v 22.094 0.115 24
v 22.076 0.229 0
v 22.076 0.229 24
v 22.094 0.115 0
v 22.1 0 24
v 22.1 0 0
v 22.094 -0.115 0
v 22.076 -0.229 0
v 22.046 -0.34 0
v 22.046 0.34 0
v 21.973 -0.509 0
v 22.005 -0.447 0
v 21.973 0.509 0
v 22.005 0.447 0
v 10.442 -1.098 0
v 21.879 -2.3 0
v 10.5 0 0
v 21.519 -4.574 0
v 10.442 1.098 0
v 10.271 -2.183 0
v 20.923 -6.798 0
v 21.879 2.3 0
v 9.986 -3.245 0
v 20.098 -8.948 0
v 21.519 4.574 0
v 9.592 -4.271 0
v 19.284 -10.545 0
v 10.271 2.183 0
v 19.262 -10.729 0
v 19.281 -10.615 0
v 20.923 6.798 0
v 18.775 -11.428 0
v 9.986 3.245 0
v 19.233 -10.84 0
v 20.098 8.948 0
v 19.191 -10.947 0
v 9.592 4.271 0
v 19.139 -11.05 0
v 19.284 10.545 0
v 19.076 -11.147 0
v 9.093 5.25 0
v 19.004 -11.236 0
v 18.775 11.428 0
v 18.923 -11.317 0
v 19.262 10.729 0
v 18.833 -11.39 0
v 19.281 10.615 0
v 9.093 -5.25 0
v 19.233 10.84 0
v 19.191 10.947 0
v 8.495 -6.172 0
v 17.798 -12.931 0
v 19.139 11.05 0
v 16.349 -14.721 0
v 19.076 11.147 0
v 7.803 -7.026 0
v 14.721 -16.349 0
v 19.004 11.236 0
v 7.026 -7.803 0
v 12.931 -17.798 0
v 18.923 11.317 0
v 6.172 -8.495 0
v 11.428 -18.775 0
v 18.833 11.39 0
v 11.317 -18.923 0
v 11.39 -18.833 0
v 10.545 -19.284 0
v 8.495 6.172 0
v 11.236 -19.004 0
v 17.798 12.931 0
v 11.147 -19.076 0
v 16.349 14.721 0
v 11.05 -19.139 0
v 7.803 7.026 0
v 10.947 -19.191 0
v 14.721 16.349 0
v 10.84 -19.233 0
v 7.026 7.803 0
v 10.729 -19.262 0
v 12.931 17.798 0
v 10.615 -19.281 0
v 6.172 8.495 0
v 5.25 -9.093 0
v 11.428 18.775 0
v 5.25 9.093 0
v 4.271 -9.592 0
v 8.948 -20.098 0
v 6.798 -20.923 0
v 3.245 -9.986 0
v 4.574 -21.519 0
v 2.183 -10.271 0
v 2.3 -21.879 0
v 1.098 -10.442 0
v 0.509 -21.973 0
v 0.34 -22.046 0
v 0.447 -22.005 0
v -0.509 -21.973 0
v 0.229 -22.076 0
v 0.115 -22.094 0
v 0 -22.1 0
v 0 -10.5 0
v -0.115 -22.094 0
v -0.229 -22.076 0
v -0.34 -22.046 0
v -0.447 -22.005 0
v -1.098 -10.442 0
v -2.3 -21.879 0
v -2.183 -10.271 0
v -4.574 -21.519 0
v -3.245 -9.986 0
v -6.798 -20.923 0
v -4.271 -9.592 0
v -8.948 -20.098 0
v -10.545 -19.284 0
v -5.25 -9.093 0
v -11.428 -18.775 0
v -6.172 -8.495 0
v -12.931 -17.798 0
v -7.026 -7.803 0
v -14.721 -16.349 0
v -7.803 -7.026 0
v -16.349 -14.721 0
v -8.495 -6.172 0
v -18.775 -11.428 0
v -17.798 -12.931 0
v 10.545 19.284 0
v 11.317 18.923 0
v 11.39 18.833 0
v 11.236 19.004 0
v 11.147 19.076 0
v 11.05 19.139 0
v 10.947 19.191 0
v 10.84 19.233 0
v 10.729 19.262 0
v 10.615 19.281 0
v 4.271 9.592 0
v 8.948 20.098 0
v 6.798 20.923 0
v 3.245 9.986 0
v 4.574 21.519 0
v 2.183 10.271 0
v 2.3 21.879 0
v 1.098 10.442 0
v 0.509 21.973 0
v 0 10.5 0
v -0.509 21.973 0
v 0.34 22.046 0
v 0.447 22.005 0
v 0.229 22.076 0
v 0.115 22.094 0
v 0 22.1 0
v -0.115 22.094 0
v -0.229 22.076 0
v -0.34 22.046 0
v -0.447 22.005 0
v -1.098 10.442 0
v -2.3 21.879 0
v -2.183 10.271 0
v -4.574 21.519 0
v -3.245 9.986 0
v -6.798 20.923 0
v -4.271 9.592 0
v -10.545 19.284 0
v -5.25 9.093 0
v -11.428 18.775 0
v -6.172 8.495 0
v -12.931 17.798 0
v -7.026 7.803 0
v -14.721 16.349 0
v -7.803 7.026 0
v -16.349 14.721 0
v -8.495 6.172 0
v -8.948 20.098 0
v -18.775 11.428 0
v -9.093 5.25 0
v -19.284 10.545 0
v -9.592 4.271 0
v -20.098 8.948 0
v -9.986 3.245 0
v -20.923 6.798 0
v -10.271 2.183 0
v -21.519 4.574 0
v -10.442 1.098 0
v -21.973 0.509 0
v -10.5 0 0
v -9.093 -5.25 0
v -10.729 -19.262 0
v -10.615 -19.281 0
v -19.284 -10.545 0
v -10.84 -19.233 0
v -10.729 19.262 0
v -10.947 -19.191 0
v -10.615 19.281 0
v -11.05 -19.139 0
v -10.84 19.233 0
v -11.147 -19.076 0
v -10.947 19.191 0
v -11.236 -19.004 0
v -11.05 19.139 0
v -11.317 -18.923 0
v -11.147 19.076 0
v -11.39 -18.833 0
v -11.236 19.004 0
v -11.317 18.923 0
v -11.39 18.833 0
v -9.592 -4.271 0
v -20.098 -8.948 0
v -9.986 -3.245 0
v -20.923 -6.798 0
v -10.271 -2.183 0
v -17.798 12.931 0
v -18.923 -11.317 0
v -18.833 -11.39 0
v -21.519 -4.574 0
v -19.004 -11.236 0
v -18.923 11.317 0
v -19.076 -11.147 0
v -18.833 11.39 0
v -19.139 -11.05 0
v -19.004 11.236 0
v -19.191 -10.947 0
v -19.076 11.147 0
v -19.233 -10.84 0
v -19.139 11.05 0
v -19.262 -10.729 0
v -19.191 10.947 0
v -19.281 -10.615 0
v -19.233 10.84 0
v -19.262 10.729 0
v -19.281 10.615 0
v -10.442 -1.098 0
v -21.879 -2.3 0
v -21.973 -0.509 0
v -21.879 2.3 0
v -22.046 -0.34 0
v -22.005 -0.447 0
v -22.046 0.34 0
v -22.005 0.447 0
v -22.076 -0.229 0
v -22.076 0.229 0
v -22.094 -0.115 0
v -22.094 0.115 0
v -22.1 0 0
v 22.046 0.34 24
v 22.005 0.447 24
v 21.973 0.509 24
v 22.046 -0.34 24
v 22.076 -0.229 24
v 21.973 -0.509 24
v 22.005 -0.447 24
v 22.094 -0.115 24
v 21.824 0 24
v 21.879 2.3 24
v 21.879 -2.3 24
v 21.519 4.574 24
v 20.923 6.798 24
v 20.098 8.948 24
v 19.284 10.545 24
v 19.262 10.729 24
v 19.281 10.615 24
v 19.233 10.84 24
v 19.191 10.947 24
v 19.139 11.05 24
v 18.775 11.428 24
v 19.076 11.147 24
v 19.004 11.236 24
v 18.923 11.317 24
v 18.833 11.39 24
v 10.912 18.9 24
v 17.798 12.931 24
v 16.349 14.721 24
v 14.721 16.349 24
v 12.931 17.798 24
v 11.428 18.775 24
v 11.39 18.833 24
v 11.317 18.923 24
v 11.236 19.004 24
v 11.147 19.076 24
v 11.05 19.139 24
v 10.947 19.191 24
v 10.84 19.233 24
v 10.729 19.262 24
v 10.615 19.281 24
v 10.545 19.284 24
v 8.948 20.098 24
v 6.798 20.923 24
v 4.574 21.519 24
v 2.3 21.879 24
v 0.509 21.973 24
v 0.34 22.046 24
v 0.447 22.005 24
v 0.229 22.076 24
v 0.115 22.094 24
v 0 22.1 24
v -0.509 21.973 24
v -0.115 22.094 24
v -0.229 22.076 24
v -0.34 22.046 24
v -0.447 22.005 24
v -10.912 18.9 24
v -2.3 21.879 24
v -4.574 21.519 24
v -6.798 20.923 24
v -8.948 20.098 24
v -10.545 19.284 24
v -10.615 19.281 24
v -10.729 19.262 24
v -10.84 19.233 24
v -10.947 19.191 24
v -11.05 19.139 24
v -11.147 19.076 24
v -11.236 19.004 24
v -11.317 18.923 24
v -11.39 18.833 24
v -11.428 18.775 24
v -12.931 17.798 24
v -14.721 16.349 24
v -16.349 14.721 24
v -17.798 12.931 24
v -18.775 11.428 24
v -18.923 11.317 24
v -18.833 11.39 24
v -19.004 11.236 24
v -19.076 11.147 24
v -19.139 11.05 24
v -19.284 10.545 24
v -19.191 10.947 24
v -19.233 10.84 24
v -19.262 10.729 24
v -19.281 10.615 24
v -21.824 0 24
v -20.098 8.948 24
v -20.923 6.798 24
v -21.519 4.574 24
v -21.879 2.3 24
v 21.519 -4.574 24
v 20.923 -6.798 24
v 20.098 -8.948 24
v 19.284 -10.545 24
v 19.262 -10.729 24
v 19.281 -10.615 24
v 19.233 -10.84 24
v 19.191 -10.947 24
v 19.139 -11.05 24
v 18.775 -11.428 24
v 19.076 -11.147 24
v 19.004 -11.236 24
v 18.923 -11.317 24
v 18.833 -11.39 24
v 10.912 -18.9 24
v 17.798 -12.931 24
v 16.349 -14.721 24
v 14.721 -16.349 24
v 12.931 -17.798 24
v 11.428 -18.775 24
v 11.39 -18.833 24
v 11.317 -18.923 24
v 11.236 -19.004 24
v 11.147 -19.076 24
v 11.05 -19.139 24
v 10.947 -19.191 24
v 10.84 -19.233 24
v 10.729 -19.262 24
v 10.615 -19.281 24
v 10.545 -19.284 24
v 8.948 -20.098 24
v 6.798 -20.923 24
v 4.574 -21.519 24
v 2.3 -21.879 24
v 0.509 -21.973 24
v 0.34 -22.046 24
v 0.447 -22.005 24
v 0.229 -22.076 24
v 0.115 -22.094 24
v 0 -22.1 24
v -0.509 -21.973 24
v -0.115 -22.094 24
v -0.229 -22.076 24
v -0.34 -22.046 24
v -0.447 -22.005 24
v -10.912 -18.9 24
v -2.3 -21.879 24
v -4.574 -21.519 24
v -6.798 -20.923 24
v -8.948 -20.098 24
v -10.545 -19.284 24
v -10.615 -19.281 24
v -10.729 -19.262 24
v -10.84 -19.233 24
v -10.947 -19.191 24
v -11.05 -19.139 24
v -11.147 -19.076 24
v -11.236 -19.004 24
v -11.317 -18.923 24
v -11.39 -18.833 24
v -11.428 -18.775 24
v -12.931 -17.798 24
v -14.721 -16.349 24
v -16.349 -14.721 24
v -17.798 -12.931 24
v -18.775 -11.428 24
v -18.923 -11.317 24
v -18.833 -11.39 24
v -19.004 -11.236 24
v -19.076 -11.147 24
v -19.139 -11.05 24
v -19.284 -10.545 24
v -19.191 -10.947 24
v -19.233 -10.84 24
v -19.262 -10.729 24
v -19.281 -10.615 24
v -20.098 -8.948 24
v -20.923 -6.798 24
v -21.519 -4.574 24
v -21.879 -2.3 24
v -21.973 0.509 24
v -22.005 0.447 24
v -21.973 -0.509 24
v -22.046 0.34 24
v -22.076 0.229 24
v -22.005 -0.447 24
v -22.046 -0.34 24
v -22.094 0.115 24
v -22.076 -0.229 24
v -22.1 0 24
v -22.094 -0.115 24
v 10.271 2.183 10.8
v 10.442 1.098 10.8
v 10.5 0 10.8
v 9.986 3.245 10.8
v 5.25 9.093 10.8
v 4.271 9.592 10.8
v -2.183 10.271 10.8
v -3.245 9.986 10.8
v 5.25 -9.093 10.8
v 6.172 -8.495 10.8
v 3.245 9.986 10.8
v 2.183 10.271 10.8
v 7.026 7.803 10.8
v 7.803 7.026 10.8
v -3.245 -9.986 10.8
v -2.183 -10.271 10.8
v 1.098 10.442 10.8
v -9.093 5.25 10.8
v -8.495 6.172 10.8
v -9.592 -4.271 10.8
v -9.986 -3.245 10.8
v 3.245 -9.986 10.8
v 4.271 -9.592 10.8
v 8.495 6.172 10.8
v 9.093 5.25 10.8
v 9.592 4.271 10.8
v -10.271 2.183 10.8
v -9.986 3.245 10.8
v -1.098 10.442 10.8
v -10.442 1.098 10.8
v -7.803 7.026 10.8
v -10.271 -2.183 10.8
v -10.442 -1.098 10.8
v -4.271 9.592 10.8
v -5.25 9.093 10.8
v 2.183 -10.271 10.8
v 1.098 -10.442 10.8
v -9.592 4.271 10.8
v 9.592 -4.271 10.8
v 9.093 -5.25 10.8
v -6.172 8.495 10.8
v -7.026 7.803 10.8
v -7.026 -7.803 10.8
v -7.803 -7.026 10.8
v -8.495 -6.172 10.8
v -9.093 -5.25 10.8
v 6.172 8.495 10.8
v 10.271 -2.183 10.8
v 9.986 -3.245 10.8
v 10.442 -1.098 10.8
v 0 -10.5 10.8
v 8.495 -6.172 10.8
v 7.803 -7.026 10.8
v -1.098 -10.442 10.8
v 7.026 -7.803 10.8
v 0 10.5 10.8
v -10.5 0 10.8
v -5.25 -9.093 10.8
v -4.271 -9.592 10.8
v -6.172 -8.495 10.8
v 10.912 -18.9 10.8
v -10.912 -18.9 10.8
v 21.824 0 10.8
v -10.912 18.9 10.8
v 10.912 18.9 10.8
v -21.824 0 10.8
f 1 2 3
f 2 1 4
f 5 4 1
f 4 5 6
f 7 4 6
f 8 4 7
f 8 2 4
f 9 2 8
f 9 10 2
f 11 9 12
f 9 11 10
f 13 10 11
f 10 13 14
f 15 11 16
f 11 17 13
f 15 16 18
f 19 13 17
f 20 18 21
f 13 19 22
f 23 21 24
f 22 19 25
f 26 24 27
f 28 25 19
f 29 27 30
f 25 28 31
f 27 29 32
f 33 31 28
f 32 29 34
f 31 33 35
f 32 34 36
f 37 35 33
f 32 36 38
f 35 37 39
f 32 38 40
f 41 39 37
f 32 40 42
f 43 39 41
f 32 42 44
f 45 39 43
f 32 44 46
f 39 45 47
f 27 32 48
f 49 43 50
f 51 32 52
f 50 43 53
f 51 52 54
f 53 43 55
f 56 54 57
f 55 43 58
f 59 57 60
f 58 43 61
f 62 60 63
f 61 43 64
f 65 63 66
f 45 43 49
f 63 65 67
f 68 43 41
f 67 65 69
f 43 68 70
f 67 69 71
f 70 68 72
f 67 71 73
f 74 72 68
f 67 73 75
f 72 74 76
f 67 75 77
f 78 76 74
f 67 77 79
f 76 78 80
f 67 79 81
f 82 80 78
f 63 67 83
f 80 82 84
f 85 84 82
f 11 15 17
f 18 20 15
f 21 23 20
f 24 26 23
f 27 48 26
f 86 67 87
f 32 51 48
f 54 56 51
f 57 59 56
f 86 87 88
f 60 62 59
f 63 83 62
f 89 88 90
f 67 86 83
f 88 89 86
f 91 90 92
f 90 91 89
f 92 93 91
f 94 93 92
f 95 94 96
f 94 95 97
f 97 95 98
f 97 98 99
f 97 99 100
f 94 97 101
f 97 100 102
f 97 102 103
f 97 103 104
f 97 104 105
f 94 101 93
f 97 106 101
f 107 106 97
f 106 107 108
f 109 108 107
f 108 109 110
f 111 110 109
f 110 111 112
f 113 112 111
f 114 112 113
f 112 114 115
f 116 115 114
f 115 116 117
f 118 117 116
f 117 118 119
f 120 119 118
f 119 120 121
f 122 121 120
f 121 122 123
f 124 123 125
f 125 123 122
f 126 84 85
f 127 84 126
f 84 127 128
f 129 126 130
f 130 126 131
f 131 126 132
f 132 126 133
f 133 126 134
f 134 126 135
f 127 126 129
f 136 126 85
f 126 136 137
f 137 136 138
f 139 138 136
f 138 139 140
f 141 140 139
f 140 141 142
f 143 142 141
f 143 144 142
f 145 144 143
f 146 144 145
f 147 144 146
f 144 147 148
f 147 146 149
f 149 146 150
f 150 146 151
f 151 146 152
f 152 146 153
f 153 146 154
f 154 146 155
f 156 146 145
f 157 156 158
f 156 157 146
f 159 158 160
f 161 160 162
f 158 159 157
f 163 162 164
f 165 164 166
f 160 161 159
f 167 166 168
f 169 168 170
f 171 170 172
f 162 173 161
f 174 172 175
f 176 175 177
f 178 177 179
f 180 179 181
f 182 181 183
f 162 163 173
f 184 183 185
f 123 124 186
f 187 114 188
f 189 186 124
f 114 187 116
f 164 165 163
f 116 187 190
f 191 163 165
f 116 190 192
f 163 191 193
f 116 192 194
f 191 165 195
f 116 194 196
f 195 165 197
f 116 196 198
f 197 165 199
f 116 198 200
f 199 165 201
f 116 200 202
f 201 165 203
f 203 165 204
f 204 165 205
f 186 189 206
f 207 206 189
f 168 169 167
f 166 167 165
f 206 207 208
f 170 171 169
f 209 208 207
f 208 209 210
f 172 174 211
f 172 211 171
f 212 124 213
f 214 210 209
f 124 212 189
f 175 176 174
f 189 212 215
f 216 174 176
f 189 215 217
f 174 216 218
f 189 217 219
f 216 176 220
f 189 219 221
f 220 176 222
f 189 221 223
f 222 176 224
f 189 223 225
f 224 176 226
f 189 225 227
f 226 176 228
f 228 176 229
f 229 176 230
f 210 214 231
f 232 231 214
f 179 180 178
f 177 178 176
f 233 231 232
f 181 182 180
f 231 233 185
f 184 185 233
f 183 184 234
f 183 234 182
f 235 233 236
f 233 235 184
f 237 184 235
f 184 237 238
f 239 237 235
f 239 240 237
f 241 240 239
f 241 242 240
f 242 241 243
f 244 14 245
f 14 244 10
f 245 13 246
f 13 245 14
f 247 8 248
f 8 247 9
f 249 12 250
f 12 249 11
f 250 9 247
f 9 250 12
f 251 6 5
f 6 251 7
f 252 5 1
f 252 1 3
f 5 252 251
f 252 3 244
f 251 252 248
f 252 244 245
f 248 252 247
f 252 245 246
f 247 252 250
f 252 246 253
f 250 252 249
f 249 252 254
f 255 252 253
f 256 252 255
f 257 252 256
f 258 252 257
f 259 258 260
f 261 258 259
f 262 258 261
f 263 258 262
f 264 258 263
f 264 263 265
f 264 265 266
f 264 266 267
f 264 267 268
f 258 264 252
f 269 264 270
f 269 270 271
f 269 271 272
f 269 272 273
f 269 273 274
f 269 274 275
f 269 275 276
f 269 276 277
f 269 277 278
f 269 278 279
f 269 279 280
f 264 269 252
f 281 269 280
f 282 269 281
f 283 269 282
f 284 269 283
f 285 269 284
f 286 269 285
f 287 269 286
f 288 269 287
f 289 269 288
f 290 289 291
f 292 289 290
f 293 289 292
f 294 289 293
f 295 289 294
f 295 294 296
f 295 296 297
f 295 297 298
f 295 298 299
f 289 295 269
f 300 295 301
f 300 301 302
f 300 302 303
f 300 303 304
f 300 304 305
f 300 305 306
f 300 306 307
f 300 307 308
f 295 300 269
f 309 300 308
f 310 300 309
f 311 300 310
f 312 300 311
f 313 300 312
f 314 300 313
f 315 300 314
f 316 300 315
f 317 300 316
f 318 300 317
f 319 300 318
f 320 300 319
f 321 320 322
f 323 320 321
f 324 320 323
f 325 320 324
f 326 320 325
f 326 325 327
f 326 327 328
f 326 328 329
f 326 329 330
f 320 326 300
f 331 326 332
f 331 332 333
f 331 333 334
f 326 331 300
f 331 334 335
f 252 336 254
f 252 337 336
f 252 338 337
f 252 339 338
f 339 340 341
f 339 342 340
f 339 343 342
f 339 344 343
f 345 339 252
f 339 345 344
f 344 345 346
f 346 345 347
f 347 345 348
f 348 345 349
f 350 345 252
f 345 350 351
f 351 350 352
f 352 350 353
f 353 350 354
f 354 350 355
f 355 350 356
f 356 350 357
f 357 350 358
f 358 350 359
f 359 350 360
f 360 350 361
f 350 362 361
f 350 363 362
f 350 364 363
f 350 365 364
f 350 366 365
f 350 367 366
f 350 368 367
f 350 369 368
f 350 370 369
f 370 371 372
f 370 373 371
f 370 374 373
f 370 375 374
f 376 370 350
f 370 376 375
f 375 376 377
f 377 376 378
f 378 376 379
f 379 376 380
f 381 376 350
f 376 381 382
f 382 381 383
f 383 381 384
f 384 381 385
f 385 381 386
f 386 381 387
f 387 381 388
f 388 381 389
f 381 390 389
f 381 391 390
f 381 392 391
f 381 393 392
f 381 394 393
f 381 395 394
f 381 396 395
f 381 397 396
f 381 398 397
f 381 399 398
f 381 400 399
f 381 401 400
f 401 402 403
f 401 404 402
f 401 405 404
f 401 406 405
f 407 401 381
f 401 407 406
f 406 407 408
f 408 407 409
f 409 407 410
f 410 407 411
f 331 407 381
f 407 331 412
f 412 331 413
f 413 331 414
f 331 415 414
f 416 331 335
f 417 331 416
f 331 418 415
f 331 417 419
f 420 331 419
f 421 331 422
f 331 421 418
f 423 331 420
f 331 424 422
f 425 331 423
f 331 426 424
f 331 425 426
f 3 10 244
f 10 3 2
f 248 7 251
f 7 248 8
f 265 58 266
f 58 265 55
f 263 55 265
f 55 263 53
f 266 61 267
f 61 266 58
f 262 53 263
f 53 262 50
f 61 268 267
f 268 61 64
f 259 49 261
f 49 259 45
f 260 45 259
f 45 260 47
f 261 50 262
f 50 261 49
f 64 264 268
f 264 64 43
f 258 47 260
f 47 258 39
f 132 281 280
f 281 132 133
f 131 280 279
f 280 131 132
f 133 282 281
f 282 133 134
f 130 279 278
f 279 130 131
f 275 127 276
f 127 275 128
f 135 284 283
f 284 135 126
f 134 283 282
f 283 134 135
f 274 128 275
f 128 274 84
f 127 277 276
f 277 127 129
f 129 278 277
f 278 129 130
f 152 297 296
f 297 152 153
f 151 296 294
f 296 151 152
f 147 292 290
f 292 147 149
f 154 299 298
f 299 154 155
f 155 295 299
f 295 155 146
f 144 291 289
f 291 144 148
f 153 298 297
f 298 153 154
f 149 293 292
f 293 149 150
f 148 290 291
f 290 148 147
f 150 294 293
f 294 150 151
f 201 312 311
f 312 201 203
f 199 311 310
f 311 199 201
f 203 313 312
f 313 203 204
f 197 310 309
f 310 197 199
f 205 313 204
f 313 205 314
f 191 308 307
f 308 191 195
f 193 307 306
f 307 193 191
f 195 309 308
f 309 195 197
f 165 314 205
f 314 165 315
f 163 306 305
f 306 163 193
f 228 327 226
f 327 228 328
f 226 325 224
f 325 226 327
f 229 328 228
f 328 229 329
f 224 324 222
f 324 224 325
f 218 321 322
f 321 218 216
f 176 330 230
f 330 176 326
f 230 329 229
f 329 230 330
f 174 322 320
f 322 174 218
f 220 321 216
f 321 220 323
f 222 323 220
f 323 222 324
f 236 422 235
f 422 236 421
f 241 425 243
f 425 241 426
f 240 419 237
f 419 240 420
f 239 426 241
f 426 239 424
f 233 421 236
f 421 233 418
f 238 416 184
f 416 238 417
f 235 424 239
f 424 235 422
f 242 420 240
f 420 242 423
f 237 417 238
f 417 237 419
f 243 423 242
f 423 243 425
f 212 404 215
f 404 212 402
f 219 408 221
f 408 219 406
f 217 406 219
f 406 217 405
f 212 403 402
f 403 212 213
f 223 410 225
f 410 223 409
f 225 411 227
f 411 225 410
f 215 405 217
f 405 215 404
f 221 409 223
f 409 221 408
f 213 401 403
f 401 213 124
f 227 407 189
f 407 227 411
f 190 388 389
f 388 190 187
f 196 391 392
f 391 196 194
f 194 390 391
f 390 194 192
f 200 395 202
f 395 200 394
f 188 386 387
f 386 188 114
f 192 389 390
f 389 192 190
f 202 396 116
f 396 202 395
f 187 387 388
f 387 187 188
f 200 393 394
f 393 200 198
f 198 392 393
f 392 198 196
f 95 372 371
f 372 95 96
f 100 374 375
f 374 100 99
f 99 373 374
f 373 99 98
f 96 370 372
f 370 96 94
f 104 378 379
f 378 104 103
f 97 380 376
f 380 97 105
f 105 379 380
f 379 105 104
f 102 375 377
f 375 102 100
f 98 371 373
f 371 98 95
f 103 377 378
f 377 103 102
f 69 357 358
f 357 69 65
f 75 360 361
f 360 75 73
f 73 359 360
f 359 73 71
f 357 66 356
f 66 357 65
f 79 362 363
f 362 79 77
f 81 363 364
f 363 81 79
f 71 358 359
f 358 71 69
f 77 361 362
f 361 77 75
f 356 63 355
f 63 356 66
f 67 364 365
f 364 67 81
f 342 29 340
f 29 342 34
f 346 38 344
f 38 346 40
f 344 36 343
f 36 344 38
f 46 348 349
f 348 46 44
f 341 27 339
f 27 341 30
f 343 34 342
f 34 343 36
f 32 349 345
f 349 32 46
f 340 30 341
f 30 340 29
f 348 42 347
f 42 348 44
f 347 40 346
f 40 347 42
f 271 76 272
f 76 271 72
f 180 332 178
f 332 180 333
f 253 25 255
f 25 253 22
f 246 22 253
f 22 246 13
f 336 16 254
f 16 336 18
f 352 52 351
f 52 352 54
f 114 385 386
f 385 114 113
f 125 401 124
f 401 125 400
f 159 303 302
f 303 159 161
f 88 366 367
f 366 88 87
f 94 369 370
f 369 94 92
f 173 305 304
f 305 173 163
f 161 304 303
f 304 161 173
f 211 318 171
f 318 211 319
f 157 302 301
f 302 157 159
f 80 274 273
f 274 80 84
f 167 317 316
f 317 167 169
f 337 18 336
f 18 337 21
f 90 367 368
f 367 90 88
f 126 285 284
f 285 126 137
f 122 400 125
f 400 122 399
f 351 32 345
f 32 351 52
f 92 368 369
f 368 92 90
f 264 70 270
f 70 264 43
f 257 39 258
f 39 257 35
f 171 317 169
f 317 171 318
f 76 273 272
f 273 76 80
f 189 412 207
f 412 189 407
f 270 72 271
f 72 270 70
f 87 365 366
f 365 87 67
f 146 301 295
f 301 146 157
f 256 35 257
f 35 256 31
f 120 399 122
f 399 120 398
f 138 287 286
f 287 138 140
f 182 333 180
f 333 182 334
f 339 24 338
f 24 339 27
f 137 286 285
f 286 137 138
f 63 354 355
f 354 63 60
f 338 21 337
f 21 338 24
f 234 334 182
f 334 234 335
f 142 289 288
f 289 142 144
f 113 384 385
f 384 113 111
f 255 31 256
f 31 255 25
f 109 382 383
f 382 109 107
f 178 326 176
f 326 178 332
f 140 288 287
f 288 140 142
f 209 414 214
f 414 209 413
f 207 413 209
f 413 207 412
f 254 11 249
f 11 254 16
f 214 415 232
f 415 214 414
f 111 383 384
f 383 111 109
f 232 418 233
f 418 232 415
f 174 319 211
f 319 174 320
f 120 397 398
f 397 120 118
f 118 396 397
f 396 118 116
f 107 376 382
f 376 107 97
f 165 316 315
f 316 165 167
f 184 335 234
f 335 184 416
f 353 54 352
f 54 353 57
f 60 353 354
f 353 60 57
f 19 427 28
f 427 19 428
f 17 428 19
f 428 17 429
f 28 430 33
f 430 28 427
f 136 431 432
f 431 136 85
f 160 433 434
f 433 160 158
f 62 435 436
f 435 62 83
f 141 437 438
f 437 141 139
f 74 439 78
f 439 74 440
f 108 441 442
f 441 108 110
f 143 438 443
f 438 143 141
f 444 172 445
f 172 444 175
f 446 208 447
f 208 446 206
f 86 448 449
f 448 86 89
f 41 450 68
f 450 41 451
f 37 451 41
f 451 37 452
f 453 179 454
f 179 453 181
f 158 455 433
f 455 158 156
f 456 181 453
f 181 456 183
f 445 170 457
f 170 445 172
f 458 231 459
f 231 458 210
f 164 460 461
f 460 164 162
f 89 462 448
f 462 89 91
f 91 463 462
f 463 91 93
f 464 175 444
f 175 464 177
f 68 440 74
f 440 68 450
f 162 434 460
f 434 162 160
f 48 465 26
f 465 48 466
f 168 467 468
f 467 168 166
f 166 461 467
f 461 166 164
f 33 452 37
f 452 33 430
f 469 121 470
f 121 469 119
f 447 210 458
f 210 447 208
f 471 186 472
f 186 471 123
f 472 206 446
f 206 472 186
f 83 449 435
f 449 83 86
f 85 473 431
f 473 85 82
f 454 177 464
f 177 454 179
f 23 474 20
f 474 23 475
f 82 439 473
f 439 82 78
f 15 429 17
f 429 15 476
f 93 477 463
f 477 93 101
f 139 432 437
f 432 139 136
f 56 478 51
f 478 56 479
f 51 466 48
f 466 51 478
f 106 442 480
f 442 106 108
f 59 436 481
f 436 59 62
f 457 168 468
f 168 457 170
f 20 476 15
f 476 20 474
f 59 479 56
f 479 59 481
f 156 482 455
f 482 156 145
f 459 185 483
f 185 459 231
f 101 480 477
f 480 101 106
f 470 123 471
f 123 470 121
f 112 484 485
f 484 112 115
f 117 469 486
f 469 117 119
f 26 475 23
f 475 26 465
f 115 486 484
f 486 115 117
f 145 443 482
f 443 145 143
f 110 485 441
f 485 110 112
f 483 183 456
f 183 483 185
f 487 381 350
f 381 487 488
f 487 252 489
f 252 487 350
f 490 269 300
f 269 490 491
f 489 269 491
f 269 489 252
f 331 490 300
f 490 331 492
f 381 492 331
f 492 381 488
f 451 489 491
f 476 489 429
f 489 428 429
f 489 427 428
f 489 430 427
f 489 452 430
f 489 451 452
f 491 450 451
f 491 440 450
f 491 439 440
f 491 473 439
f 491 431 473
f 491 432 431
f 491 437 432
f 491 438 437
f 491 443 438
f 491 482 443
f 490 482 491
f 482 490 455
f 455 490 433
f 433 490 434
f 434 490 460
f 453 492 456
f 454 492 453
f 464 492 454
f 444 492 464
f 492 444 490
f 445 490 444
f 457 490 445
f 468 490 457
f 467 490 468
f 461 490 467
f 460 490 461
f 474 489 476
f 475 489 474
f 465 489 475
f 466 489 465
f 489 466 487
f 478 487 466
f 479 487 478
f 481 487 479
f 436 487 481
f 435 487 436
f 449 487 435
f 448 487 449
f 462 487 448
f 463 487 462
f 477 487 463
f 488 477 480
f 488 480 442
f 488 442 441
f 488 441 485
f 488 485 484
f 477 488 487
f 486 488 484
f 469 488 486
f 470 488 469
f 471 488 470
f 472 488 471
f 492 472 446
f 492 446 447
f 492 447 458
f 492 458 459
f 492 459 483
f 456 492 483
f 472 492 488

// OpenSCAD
// Knurled-style thumb knob with hex socket.
$fn = 60;
eps = 0.02;
thread_d = 21;
knob_d = 44;
knob_h = 24;
socket_flat = thread_d * 1.8;
difference() {
    union() {
        cylinder(d = knob_d, h = knob_h);
        for (i = [0 : 11]) rotate([0, 0, i * 30]) translate([knob_d / 2 - 1, 0, 0]) cylinder(d = 2.2, h = knob_h);
    }
    translate([0, 0, -eps]) cylinder(d = thread_d, h = knob_h + 2 * eps);
    translate([0, 0, knob_h - knob_h * 0.55]) cylinder(d = socket_flat / cos(30), h = knob_h * 0.55 + eps, $fn = 6);
}
